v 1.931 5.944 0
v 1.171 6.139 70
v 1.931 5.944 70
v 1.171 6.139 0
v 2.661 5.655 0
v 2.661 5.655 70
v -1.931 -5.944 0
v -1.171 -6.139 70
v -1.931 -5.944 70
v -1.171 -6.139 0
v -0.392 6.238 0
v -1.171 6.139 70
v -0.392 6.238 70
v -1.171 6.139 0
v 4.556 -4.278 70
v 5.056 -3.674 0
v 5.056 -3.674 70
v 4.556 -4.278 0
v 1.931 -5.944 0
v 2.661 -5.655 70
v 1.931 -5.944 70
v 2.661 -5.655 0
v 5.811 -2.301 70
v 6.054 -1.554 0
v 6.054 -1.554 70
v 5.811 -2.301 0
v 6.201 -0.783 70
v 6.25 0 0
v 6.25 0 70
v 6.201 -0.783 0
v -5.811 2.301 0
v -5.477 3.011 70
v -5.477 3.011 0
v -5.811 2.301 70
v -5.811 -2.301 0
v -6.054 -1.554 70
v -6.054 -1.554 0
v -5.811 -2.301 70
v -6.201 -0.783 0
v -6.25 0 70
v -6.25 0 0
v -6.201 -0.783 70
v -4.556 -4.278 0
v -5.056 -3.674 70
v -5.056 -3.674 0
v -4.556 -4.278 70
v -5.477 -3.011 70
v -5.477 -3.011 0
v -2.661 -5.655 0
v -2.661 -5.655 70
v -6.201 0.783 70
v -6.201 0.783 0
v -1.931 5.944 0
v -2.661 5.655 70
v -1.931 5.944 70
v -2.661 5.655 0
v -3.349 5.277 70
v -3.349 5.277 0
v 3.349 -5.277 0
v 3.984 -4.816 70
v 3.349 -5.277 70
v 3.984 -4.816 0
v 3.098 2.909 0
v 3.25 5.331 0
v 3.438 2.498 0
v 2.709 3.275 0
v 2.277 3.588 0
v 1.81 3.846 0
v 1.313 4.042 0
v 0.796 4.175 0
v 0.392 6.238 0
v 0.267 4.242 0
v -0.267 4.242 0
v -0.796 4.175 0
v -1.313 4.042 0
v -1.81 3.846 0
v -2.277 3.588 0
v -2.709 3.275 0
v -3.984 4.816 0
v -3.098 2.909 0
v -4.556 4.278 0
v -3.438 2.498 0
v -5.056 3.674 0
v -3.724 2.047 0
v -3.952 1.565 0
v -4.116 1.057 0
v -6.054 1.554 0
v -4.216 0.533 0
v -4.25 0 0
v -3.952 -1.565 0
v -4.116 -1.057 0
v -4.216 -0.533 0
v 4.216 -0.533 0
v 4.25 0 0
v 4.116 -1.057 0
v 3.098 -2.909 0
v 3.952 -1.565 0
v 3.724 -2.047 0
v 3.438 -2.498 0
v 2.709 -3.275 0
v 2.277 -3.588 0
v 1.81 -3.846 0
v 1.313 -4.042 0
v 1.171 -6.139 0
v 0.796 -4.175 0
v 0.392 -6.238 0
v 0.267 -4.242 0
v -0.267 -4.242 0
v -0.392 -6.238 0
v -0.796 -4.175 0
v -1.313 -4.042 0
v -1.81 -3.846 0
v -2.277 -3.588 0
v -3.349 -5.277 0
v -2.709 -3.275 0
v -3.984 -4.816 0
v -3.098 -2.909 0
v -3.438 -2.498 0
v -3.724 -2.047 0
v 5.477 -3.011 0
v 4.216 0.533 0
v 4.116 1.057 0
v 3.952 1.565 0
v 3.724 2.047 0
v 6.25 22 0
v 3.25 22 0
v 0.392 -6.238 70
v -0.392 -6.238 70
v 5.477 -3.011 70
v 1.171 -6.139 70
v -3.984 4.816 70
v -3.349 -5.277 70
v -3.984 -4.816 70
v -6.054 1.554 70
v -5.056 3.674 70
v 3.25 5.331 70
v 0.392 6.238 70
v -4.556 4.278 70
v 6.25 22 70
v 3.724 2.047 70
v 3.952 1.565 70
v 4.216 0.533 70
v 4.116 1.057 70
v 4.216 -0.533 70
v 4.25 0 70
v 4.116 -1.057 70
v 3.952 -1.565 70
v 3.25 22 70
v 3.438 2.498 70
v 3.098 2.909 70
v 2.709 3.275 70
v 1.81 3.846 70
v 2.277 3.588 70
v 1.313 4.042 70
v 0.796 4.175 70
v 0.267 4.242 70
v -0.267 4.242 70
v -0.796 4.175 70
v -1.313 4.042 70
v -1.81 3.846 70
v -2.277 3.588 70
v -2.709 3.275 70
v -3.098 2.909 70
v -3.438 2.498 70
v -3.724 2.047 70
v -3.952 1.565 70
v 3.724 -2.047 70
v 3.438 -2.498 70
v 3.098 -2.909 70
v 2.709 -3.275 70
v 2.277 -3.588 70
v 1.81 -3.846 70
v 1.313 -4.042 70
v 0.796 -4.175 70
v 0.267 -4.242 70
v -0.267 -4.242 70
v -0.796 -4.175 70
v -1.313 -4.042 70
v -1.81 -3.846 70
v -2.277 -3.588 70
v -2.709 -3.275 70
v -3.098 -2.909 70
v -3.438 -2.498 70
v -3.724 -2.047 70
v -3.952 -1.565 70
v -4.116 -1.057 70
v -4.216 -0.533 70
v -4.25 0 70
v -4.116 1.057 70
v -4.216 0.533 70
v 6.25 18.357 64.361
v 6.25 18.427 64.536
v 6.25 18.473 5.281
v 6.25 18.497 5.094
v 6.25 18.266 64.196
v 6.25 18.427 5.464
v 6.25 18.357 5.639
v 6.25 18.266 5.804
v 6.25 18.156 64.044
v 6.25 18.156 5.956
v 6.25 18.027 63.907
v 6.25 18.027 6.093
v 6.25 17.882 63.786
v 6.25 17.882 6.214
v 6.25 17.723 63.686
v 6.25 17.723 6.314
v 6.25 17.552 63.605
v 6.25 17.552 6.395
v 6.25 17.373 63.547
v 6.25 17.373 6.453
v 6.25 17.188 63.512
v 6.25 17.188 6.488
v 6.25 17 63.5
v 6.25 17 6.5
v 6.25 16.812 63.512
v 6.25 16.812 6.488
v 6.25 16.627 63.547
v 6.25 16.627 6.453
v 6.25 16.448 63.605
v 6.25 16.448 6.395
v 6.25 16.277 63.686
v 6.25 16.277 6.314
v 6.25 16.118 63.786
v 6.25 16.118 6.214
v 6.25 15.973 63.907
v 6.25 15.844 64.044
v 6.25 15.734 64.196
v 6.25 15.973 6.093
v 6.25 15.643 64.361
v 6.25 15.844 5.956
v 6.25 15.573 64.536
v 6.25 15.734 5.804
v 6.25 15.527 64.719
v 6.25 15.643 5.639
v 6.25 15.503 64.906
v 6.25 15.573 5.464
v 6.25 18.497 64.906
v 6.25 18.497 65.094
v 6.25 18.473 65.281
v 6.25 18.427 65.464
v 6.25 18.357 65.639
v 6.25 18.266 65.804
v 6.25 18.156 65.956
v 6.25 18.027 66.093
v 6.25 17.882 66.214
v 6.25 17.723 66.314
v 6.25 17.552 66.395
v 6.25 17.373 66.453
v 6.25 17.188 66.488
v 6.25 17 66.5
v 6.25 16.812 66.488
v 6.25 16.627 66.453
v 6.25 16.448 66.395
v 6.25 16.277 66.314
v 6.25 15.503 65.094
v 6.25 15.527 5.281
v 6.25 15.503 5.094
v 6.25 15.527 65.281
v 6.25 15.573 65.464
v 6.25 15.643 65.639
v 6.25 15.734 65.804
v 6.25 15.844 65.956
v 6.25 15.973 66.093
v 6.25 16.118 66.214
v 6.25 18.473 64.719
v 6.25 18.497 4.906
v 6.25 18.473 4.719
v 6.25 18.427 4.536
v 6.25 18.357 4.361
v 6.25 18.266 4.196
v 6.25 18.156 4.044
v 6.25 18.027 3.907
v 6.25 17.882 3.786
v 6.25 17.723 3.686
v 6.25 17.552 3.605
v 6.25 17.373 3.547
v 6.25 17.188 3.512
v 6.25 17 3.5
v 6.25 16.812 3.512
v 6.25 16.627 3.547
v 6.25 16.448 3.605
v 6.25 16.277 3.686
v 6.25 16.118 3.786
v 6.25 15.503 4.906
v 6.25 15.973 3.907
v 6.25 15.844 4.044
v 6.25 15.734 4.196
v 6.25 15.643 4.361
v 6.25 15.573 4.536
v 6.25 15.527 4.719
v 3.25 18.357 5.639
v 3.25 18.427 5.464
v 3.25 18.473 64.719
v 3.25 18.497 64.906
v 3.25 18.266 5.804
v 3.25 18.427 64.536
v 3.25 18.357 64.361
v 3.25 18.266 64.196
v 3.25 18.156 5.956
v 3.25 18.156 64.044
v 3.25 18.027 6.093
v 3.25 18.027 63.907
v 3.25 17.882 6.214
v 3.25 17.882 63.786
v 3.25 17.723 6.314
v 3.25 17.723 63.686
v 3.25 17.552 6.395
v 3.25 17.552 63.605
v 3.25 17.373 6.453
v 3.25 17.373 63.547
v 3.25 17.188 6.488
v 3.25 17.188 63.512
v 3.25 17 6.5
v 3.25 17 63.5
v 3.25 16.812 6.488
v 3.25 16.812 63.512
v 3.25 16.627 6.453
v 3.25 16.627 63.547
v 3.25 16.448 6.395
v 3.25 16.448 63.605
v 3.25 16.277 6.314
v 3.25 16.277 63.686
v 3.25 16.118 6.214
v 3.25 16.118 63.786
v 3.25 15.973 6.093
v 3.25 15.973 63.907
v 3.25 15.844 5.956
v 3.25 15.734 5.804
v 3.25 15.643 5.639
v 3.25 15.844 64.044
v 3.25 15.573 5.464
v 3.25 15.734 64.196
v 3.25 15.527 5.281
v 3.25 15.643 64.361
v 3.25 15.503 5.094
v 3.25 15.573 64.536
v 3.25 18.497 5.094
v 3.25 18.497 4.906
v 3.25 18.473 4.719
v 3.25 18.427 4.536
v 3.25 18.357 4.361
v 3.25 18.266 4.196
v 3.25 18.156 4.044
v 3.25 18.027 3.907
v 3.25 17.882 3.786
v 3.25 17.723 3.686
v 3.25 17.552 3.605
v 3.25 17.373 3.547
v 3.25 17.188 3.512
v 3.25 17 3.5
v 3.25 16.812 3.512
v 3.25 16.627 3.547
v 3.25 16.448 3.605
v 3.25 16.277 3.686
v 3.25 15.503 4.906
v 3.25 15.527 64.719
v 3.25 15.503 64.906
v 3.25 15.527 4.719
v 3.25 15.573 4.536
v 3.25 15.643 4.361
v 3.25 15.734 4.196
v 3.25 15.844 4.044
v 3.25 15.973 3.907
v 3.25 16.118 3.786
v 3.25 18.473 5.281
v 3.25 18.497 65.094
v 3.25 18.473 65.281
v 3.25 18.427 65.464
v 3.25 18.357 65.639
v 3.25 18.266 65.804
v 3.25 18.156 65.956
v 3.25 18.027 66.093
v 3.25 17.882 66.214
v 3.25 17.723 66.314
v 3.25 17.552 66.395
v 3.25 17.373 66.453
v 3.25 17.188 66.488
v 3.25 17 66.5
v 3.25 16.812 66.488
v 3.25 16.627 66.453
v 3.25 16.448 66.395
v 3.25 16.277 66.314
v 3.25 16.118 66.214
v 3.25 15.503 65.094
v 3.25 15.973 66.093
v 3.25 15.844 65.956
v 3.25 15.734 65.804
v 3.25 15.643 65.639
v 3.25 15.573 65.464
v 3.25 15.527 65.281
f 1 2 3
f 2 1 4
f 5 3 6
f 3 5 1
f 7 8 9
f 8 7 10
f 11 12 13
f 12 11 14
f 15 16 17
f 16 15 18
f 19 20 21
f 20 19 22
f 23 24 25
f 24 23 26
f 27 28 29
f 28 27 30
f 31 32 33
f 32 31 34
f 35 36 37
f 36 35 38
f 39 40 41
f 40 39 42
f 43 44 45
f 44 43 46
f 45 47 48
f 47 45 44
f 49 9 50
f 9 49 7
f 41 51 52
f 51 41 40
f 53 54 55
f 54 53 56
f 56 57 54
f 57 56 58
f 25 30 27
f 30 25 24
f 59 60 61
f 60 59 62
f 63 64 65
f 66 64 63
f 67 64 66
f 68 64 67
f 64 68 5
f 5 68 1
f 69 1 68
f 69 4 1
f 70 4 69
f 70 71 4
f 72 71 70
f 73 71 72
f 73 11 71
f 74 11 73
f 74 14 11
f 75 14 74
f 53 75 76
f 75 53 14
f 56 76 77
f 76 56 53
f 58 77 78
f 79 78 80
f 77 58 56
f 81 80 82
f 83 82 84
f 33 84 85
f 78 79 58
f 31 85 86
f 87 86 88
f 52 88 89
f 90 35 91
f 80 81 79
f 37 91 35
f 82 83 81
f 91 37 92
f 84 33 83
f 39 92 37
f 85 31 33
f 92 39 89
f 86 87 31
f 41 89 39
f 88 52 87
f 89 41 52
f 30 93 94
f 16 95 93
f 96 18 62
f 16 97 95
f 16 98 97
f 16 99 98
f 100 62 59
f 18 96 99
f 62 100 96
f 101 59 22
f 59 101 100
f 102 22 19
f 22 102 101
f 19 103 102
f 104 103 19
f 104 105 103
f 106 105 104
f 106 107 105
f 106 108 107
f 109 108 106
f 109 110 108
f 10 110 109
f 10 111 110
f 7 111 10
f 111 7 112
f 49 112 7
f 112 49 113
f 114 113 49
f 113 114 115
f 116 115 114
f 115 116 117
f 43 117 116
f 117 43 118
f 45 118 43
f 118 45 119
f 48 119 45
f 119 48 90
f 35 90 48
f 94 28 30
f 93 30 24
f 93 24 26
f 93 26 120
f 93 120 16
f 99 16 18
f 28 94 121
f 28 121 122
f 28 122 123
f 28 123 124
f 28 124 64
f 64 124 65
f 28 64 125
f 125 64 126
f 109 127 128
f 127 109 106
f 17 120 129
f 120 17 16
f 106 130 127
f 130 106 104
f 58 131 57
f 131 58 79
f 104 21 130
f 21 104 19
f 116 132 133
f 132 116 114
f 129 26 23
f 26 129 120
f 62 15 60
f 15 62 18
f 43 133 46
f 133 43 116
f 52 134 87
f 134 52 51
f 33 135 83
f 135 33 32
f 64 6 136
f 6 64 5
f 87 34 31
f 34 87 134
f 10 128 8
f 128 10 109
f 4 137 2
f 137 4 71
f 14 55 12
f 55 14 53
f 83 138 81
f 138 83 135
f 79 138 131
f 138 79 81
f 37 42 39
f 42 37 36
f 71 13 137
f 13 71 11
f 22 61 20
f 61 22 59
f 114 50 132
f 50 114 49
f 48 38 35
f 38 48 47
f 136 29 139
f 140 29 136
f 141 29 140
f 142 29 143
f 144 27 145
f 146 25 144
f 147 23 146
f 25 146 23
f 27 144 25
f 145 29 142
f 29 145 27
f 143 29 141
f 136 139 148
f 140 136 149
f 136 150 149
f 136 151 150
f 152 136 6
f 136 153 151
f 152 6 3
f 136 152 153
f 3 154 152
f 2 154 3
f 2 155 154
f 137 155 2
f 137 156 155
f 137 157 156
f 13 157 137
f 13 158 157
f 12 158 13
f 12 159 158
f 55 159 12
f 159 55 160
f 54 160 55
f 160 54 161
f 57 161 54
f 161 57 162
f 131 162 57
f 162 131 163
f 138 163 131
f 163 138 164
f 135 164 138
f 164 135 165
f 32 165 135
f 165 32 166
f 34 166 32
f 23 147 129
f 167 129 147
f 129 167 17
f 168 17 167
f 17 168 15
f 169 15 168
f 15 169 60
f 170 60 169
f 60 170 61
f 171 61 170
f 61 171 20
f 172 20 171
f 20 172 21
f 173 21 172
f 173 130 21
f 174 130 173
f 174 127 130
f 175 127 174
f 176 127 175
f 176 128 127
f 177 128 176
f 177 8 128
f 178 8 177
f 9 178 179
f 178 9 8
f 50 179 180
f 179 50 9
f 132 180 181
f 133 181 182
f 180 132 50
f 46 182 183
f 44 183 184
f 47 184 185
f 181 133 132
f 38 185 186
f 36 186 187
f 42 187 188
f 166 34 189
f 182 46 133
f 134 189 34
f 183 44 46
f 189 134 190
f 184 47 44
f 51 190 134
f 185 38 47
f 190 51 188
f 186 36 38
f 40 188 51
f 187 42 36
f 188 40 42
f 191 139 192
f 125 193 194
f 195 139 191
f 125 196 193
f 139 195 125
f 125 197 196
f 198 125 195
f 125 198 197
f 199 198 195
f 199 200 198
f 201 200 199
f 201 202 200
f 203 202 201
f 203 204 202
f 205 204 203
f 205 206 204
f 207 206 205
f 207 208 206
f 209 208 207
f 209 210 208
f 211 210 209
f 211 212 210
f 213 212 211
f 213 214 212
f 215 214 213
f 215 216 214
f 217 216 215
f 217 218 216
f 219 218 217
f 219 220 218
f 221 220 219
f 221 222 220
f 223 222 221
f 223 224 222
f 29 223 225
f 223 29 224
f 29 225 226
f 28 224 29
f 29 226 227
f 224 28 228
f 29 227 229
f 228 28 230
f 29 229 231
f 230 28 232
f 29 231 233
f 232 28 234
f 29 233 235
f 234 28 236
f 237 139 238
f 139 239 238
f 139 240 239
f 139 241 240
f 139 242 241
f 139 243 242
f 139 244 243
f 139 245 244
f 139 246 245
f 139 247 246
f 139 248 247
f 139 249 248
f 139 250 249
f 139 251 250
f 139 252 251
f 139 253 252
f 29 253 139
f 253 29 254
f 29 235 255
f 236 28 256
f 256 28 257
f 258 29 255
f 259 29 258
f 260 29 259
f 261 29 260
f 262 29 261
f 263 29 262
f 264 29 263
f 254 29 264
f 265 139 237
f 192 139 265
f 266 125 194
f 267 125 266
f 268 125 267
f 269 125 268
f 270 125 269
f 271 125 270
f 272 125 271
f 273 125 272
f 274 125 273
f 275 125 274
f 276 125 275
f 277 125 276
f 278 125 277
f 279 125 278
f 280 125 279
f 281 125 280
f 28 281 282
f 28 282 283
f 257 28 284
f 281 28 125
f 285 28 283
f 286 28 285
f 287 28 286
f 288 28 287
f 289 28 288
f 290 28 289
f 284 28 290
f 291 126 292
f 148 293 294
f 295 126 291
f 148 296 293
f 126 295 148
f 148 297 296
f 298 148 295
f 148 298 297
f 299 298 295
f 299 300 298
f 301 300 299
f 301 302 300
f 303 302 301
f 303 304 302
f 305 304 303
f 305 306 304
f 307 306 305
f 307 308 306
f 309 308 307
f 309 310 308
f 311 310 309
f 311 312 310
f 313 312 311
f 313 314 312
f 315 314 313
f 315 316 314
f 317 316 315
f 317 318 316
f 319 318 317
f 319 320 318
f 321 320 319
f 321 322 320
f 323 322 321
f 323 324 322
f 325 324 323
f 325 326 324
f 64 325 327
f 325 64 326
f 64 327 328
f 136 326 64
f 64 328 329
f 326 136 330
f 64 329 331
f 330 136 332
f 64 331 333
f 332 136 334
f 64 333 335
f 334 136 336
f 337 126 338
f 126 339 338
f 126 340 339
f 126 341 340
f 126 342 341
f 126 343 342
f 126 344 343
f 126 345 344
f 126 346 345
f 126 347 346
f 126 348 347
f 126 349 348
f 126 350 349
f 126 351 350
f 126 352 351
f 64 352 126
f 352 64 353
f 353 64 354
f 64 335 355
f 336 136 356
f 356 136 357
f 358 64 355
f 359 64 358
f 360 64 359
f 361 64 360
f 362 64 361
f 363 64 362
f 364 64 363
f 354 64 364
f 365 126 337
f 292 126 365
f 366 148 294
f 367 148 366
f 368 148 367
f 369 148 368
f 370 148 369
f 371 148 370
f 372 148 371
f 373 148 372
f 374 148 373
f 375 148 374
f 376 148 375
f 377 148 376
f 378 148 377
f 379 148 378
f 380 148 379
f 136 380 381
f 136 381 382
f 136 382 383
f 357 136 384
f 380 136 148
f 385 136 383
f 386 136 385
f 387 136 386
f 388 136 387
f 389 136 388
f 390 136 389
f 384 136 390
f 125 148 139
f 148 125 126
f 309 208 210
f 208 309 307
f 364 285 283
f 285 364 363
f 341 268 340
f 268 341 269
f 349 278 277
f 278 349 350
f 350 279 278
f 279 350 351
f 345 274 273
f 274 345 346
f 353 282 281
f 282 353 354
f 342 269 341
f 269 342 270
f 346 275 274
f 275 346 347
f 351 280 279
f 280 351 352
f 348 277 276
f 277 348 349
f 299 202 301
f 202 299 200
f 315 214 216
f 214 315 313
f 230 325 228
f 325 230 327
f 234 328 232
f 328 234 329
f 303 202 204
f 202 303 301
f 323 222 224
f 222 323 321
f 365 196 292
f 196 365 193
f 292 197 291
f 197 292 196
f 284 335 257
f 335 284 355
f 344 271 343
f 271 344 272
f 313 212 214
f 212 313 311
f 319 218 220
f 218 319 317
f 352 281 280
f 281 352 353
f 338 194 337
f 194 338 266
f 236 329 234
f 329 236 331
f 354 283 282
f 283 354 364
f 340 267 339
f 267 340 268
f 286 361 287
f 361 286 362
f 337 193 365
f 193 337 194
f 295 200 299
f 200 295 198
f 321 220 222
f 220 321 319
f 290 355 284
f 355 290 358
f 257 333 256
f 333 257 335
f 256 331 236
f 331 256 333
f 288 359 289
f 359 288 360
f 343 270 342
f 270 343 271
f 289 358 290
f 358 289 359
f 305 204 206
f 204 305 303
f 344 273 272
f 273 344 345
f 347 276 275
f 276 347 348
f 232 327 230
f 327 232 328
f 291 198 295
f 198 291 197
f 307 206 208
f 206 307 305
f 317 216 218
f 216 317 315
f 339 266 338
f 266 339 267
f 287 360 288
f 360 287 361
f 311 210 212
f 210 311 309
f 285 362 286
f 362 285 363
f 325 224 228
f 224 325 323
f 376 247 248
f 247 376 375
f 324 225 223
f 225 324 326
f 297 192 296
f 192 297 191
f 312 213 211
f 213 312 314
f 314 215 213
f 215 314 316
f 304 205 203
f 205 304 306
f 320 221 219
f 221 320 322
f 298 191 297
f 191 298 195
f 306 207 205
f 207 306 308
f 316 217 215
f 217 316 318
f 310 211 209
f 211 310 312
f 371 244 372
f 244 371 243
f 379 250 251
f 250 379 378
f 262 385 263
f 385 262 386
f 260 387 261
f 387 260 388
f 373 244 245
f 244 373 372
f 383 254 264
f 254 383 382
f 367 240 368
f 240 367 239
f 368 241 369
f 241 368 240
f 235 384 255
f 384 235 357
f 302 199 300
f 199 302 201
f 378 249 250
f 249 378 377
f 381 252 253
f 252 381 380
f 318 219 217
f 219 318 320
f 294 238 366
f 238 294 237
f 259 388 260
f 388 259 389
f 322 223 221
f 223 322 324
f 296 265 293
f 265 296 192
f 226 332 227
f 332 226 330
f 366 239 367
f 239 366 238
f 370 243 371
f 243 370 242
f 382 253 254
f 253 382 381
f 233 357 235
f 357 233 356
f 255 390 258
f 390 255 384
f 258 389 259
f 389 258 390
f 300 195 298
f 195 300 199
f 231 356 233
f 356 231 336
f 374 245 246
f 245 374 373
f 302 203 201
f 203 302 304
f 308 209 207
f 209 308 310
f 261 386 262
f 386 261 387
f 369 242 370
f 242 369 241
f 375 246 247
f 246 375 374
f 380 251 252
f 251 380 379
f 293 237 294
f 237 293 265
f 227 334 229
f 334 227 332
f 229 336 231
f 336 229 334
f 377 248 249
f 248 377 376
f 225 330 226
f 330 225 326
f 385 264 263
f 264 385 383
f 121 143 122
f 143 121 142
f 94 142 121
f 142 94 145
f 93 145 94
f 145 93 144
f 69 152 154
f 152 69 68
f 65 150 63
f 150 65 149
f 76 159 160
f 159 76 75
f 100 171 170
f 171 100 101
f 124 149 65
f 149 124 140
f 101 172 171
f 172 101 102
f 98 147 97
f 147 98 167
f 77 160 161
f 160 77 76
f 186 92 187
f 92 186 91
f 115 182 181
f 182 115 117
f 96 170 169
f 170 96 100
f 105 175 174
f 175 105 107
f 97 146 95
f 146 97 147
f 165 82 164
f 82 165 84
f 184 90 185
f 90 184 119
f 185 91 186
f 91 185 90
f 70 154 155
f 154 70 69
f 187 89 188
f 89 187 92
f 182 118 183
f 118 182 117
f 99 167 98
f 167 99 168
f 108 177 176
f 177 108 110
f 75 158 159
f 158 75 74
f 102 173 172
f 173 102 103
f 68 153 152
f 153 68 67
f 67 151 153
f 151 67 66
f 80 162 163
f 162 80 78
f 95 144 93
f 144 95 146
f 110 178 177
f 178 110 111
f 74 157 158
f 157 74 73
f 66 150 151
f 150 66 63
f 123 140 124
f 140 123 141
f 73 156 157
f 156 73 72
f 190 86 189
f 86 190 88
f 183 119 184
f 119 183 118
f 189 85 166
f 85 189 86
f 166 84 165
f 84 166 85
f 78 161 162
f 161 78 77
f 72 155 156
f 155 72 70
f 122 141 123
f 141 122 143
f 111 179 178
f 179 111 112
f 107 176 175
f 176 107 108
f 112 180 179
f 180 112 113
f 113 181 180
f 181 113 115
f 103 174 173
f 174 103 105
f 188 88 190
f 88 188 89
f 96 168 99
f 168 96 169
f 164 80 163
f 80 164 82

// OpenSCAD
PIPE_DIA = 8.5;
WALL_THICKNESS = 2;
BASE_THICKNESS = 3;

MOUNT_HOLE_DIA = 3;
MOUNT_HOLE_SPACING_X = 10;
MOUNT_HOLE_SPACING_Y = 60;

WIDTH = 22;
LENGTH = 70;

$fn = 50;

difference() {
    delta = PIPE_DIA/2 + WALL_THICKNESS - BASE_THICKNESS;

    union() {
        cylinder(d = PIPE_DIA + 2 * WALL_THICKNESS, h = LENGTH);
        translate([delta, 0, 0])
        cube(size = [BASE_THICKNESS, WIDTH, LENGTH]);
    }

    #translate([delta, WIDTH - MOUNT_HOLE_SPACING_X/2, (LENGTH-MOUNT_HOLE_SPACING_Y)/2])
    rotate([0, 90, 0])
    cylinder(d = MOUNT_HOLE_DIA, h = BASE_THICKNESS);

    #translate([delta, WIDTH - MOUNT_HOLE_SPACING_X/2, (LENGTH-MOUNT_HOLE_SPACING_Y)/2 + MOUNT_HOLE_SPACING_Y])
    rotate([0, 90, 0])
    cylinder(d = MOUNT_HOLE_DIA, h = BASE_THICKNESS);

    #cylinder(d = PIPE_DIA, h = LENGTH);
}
